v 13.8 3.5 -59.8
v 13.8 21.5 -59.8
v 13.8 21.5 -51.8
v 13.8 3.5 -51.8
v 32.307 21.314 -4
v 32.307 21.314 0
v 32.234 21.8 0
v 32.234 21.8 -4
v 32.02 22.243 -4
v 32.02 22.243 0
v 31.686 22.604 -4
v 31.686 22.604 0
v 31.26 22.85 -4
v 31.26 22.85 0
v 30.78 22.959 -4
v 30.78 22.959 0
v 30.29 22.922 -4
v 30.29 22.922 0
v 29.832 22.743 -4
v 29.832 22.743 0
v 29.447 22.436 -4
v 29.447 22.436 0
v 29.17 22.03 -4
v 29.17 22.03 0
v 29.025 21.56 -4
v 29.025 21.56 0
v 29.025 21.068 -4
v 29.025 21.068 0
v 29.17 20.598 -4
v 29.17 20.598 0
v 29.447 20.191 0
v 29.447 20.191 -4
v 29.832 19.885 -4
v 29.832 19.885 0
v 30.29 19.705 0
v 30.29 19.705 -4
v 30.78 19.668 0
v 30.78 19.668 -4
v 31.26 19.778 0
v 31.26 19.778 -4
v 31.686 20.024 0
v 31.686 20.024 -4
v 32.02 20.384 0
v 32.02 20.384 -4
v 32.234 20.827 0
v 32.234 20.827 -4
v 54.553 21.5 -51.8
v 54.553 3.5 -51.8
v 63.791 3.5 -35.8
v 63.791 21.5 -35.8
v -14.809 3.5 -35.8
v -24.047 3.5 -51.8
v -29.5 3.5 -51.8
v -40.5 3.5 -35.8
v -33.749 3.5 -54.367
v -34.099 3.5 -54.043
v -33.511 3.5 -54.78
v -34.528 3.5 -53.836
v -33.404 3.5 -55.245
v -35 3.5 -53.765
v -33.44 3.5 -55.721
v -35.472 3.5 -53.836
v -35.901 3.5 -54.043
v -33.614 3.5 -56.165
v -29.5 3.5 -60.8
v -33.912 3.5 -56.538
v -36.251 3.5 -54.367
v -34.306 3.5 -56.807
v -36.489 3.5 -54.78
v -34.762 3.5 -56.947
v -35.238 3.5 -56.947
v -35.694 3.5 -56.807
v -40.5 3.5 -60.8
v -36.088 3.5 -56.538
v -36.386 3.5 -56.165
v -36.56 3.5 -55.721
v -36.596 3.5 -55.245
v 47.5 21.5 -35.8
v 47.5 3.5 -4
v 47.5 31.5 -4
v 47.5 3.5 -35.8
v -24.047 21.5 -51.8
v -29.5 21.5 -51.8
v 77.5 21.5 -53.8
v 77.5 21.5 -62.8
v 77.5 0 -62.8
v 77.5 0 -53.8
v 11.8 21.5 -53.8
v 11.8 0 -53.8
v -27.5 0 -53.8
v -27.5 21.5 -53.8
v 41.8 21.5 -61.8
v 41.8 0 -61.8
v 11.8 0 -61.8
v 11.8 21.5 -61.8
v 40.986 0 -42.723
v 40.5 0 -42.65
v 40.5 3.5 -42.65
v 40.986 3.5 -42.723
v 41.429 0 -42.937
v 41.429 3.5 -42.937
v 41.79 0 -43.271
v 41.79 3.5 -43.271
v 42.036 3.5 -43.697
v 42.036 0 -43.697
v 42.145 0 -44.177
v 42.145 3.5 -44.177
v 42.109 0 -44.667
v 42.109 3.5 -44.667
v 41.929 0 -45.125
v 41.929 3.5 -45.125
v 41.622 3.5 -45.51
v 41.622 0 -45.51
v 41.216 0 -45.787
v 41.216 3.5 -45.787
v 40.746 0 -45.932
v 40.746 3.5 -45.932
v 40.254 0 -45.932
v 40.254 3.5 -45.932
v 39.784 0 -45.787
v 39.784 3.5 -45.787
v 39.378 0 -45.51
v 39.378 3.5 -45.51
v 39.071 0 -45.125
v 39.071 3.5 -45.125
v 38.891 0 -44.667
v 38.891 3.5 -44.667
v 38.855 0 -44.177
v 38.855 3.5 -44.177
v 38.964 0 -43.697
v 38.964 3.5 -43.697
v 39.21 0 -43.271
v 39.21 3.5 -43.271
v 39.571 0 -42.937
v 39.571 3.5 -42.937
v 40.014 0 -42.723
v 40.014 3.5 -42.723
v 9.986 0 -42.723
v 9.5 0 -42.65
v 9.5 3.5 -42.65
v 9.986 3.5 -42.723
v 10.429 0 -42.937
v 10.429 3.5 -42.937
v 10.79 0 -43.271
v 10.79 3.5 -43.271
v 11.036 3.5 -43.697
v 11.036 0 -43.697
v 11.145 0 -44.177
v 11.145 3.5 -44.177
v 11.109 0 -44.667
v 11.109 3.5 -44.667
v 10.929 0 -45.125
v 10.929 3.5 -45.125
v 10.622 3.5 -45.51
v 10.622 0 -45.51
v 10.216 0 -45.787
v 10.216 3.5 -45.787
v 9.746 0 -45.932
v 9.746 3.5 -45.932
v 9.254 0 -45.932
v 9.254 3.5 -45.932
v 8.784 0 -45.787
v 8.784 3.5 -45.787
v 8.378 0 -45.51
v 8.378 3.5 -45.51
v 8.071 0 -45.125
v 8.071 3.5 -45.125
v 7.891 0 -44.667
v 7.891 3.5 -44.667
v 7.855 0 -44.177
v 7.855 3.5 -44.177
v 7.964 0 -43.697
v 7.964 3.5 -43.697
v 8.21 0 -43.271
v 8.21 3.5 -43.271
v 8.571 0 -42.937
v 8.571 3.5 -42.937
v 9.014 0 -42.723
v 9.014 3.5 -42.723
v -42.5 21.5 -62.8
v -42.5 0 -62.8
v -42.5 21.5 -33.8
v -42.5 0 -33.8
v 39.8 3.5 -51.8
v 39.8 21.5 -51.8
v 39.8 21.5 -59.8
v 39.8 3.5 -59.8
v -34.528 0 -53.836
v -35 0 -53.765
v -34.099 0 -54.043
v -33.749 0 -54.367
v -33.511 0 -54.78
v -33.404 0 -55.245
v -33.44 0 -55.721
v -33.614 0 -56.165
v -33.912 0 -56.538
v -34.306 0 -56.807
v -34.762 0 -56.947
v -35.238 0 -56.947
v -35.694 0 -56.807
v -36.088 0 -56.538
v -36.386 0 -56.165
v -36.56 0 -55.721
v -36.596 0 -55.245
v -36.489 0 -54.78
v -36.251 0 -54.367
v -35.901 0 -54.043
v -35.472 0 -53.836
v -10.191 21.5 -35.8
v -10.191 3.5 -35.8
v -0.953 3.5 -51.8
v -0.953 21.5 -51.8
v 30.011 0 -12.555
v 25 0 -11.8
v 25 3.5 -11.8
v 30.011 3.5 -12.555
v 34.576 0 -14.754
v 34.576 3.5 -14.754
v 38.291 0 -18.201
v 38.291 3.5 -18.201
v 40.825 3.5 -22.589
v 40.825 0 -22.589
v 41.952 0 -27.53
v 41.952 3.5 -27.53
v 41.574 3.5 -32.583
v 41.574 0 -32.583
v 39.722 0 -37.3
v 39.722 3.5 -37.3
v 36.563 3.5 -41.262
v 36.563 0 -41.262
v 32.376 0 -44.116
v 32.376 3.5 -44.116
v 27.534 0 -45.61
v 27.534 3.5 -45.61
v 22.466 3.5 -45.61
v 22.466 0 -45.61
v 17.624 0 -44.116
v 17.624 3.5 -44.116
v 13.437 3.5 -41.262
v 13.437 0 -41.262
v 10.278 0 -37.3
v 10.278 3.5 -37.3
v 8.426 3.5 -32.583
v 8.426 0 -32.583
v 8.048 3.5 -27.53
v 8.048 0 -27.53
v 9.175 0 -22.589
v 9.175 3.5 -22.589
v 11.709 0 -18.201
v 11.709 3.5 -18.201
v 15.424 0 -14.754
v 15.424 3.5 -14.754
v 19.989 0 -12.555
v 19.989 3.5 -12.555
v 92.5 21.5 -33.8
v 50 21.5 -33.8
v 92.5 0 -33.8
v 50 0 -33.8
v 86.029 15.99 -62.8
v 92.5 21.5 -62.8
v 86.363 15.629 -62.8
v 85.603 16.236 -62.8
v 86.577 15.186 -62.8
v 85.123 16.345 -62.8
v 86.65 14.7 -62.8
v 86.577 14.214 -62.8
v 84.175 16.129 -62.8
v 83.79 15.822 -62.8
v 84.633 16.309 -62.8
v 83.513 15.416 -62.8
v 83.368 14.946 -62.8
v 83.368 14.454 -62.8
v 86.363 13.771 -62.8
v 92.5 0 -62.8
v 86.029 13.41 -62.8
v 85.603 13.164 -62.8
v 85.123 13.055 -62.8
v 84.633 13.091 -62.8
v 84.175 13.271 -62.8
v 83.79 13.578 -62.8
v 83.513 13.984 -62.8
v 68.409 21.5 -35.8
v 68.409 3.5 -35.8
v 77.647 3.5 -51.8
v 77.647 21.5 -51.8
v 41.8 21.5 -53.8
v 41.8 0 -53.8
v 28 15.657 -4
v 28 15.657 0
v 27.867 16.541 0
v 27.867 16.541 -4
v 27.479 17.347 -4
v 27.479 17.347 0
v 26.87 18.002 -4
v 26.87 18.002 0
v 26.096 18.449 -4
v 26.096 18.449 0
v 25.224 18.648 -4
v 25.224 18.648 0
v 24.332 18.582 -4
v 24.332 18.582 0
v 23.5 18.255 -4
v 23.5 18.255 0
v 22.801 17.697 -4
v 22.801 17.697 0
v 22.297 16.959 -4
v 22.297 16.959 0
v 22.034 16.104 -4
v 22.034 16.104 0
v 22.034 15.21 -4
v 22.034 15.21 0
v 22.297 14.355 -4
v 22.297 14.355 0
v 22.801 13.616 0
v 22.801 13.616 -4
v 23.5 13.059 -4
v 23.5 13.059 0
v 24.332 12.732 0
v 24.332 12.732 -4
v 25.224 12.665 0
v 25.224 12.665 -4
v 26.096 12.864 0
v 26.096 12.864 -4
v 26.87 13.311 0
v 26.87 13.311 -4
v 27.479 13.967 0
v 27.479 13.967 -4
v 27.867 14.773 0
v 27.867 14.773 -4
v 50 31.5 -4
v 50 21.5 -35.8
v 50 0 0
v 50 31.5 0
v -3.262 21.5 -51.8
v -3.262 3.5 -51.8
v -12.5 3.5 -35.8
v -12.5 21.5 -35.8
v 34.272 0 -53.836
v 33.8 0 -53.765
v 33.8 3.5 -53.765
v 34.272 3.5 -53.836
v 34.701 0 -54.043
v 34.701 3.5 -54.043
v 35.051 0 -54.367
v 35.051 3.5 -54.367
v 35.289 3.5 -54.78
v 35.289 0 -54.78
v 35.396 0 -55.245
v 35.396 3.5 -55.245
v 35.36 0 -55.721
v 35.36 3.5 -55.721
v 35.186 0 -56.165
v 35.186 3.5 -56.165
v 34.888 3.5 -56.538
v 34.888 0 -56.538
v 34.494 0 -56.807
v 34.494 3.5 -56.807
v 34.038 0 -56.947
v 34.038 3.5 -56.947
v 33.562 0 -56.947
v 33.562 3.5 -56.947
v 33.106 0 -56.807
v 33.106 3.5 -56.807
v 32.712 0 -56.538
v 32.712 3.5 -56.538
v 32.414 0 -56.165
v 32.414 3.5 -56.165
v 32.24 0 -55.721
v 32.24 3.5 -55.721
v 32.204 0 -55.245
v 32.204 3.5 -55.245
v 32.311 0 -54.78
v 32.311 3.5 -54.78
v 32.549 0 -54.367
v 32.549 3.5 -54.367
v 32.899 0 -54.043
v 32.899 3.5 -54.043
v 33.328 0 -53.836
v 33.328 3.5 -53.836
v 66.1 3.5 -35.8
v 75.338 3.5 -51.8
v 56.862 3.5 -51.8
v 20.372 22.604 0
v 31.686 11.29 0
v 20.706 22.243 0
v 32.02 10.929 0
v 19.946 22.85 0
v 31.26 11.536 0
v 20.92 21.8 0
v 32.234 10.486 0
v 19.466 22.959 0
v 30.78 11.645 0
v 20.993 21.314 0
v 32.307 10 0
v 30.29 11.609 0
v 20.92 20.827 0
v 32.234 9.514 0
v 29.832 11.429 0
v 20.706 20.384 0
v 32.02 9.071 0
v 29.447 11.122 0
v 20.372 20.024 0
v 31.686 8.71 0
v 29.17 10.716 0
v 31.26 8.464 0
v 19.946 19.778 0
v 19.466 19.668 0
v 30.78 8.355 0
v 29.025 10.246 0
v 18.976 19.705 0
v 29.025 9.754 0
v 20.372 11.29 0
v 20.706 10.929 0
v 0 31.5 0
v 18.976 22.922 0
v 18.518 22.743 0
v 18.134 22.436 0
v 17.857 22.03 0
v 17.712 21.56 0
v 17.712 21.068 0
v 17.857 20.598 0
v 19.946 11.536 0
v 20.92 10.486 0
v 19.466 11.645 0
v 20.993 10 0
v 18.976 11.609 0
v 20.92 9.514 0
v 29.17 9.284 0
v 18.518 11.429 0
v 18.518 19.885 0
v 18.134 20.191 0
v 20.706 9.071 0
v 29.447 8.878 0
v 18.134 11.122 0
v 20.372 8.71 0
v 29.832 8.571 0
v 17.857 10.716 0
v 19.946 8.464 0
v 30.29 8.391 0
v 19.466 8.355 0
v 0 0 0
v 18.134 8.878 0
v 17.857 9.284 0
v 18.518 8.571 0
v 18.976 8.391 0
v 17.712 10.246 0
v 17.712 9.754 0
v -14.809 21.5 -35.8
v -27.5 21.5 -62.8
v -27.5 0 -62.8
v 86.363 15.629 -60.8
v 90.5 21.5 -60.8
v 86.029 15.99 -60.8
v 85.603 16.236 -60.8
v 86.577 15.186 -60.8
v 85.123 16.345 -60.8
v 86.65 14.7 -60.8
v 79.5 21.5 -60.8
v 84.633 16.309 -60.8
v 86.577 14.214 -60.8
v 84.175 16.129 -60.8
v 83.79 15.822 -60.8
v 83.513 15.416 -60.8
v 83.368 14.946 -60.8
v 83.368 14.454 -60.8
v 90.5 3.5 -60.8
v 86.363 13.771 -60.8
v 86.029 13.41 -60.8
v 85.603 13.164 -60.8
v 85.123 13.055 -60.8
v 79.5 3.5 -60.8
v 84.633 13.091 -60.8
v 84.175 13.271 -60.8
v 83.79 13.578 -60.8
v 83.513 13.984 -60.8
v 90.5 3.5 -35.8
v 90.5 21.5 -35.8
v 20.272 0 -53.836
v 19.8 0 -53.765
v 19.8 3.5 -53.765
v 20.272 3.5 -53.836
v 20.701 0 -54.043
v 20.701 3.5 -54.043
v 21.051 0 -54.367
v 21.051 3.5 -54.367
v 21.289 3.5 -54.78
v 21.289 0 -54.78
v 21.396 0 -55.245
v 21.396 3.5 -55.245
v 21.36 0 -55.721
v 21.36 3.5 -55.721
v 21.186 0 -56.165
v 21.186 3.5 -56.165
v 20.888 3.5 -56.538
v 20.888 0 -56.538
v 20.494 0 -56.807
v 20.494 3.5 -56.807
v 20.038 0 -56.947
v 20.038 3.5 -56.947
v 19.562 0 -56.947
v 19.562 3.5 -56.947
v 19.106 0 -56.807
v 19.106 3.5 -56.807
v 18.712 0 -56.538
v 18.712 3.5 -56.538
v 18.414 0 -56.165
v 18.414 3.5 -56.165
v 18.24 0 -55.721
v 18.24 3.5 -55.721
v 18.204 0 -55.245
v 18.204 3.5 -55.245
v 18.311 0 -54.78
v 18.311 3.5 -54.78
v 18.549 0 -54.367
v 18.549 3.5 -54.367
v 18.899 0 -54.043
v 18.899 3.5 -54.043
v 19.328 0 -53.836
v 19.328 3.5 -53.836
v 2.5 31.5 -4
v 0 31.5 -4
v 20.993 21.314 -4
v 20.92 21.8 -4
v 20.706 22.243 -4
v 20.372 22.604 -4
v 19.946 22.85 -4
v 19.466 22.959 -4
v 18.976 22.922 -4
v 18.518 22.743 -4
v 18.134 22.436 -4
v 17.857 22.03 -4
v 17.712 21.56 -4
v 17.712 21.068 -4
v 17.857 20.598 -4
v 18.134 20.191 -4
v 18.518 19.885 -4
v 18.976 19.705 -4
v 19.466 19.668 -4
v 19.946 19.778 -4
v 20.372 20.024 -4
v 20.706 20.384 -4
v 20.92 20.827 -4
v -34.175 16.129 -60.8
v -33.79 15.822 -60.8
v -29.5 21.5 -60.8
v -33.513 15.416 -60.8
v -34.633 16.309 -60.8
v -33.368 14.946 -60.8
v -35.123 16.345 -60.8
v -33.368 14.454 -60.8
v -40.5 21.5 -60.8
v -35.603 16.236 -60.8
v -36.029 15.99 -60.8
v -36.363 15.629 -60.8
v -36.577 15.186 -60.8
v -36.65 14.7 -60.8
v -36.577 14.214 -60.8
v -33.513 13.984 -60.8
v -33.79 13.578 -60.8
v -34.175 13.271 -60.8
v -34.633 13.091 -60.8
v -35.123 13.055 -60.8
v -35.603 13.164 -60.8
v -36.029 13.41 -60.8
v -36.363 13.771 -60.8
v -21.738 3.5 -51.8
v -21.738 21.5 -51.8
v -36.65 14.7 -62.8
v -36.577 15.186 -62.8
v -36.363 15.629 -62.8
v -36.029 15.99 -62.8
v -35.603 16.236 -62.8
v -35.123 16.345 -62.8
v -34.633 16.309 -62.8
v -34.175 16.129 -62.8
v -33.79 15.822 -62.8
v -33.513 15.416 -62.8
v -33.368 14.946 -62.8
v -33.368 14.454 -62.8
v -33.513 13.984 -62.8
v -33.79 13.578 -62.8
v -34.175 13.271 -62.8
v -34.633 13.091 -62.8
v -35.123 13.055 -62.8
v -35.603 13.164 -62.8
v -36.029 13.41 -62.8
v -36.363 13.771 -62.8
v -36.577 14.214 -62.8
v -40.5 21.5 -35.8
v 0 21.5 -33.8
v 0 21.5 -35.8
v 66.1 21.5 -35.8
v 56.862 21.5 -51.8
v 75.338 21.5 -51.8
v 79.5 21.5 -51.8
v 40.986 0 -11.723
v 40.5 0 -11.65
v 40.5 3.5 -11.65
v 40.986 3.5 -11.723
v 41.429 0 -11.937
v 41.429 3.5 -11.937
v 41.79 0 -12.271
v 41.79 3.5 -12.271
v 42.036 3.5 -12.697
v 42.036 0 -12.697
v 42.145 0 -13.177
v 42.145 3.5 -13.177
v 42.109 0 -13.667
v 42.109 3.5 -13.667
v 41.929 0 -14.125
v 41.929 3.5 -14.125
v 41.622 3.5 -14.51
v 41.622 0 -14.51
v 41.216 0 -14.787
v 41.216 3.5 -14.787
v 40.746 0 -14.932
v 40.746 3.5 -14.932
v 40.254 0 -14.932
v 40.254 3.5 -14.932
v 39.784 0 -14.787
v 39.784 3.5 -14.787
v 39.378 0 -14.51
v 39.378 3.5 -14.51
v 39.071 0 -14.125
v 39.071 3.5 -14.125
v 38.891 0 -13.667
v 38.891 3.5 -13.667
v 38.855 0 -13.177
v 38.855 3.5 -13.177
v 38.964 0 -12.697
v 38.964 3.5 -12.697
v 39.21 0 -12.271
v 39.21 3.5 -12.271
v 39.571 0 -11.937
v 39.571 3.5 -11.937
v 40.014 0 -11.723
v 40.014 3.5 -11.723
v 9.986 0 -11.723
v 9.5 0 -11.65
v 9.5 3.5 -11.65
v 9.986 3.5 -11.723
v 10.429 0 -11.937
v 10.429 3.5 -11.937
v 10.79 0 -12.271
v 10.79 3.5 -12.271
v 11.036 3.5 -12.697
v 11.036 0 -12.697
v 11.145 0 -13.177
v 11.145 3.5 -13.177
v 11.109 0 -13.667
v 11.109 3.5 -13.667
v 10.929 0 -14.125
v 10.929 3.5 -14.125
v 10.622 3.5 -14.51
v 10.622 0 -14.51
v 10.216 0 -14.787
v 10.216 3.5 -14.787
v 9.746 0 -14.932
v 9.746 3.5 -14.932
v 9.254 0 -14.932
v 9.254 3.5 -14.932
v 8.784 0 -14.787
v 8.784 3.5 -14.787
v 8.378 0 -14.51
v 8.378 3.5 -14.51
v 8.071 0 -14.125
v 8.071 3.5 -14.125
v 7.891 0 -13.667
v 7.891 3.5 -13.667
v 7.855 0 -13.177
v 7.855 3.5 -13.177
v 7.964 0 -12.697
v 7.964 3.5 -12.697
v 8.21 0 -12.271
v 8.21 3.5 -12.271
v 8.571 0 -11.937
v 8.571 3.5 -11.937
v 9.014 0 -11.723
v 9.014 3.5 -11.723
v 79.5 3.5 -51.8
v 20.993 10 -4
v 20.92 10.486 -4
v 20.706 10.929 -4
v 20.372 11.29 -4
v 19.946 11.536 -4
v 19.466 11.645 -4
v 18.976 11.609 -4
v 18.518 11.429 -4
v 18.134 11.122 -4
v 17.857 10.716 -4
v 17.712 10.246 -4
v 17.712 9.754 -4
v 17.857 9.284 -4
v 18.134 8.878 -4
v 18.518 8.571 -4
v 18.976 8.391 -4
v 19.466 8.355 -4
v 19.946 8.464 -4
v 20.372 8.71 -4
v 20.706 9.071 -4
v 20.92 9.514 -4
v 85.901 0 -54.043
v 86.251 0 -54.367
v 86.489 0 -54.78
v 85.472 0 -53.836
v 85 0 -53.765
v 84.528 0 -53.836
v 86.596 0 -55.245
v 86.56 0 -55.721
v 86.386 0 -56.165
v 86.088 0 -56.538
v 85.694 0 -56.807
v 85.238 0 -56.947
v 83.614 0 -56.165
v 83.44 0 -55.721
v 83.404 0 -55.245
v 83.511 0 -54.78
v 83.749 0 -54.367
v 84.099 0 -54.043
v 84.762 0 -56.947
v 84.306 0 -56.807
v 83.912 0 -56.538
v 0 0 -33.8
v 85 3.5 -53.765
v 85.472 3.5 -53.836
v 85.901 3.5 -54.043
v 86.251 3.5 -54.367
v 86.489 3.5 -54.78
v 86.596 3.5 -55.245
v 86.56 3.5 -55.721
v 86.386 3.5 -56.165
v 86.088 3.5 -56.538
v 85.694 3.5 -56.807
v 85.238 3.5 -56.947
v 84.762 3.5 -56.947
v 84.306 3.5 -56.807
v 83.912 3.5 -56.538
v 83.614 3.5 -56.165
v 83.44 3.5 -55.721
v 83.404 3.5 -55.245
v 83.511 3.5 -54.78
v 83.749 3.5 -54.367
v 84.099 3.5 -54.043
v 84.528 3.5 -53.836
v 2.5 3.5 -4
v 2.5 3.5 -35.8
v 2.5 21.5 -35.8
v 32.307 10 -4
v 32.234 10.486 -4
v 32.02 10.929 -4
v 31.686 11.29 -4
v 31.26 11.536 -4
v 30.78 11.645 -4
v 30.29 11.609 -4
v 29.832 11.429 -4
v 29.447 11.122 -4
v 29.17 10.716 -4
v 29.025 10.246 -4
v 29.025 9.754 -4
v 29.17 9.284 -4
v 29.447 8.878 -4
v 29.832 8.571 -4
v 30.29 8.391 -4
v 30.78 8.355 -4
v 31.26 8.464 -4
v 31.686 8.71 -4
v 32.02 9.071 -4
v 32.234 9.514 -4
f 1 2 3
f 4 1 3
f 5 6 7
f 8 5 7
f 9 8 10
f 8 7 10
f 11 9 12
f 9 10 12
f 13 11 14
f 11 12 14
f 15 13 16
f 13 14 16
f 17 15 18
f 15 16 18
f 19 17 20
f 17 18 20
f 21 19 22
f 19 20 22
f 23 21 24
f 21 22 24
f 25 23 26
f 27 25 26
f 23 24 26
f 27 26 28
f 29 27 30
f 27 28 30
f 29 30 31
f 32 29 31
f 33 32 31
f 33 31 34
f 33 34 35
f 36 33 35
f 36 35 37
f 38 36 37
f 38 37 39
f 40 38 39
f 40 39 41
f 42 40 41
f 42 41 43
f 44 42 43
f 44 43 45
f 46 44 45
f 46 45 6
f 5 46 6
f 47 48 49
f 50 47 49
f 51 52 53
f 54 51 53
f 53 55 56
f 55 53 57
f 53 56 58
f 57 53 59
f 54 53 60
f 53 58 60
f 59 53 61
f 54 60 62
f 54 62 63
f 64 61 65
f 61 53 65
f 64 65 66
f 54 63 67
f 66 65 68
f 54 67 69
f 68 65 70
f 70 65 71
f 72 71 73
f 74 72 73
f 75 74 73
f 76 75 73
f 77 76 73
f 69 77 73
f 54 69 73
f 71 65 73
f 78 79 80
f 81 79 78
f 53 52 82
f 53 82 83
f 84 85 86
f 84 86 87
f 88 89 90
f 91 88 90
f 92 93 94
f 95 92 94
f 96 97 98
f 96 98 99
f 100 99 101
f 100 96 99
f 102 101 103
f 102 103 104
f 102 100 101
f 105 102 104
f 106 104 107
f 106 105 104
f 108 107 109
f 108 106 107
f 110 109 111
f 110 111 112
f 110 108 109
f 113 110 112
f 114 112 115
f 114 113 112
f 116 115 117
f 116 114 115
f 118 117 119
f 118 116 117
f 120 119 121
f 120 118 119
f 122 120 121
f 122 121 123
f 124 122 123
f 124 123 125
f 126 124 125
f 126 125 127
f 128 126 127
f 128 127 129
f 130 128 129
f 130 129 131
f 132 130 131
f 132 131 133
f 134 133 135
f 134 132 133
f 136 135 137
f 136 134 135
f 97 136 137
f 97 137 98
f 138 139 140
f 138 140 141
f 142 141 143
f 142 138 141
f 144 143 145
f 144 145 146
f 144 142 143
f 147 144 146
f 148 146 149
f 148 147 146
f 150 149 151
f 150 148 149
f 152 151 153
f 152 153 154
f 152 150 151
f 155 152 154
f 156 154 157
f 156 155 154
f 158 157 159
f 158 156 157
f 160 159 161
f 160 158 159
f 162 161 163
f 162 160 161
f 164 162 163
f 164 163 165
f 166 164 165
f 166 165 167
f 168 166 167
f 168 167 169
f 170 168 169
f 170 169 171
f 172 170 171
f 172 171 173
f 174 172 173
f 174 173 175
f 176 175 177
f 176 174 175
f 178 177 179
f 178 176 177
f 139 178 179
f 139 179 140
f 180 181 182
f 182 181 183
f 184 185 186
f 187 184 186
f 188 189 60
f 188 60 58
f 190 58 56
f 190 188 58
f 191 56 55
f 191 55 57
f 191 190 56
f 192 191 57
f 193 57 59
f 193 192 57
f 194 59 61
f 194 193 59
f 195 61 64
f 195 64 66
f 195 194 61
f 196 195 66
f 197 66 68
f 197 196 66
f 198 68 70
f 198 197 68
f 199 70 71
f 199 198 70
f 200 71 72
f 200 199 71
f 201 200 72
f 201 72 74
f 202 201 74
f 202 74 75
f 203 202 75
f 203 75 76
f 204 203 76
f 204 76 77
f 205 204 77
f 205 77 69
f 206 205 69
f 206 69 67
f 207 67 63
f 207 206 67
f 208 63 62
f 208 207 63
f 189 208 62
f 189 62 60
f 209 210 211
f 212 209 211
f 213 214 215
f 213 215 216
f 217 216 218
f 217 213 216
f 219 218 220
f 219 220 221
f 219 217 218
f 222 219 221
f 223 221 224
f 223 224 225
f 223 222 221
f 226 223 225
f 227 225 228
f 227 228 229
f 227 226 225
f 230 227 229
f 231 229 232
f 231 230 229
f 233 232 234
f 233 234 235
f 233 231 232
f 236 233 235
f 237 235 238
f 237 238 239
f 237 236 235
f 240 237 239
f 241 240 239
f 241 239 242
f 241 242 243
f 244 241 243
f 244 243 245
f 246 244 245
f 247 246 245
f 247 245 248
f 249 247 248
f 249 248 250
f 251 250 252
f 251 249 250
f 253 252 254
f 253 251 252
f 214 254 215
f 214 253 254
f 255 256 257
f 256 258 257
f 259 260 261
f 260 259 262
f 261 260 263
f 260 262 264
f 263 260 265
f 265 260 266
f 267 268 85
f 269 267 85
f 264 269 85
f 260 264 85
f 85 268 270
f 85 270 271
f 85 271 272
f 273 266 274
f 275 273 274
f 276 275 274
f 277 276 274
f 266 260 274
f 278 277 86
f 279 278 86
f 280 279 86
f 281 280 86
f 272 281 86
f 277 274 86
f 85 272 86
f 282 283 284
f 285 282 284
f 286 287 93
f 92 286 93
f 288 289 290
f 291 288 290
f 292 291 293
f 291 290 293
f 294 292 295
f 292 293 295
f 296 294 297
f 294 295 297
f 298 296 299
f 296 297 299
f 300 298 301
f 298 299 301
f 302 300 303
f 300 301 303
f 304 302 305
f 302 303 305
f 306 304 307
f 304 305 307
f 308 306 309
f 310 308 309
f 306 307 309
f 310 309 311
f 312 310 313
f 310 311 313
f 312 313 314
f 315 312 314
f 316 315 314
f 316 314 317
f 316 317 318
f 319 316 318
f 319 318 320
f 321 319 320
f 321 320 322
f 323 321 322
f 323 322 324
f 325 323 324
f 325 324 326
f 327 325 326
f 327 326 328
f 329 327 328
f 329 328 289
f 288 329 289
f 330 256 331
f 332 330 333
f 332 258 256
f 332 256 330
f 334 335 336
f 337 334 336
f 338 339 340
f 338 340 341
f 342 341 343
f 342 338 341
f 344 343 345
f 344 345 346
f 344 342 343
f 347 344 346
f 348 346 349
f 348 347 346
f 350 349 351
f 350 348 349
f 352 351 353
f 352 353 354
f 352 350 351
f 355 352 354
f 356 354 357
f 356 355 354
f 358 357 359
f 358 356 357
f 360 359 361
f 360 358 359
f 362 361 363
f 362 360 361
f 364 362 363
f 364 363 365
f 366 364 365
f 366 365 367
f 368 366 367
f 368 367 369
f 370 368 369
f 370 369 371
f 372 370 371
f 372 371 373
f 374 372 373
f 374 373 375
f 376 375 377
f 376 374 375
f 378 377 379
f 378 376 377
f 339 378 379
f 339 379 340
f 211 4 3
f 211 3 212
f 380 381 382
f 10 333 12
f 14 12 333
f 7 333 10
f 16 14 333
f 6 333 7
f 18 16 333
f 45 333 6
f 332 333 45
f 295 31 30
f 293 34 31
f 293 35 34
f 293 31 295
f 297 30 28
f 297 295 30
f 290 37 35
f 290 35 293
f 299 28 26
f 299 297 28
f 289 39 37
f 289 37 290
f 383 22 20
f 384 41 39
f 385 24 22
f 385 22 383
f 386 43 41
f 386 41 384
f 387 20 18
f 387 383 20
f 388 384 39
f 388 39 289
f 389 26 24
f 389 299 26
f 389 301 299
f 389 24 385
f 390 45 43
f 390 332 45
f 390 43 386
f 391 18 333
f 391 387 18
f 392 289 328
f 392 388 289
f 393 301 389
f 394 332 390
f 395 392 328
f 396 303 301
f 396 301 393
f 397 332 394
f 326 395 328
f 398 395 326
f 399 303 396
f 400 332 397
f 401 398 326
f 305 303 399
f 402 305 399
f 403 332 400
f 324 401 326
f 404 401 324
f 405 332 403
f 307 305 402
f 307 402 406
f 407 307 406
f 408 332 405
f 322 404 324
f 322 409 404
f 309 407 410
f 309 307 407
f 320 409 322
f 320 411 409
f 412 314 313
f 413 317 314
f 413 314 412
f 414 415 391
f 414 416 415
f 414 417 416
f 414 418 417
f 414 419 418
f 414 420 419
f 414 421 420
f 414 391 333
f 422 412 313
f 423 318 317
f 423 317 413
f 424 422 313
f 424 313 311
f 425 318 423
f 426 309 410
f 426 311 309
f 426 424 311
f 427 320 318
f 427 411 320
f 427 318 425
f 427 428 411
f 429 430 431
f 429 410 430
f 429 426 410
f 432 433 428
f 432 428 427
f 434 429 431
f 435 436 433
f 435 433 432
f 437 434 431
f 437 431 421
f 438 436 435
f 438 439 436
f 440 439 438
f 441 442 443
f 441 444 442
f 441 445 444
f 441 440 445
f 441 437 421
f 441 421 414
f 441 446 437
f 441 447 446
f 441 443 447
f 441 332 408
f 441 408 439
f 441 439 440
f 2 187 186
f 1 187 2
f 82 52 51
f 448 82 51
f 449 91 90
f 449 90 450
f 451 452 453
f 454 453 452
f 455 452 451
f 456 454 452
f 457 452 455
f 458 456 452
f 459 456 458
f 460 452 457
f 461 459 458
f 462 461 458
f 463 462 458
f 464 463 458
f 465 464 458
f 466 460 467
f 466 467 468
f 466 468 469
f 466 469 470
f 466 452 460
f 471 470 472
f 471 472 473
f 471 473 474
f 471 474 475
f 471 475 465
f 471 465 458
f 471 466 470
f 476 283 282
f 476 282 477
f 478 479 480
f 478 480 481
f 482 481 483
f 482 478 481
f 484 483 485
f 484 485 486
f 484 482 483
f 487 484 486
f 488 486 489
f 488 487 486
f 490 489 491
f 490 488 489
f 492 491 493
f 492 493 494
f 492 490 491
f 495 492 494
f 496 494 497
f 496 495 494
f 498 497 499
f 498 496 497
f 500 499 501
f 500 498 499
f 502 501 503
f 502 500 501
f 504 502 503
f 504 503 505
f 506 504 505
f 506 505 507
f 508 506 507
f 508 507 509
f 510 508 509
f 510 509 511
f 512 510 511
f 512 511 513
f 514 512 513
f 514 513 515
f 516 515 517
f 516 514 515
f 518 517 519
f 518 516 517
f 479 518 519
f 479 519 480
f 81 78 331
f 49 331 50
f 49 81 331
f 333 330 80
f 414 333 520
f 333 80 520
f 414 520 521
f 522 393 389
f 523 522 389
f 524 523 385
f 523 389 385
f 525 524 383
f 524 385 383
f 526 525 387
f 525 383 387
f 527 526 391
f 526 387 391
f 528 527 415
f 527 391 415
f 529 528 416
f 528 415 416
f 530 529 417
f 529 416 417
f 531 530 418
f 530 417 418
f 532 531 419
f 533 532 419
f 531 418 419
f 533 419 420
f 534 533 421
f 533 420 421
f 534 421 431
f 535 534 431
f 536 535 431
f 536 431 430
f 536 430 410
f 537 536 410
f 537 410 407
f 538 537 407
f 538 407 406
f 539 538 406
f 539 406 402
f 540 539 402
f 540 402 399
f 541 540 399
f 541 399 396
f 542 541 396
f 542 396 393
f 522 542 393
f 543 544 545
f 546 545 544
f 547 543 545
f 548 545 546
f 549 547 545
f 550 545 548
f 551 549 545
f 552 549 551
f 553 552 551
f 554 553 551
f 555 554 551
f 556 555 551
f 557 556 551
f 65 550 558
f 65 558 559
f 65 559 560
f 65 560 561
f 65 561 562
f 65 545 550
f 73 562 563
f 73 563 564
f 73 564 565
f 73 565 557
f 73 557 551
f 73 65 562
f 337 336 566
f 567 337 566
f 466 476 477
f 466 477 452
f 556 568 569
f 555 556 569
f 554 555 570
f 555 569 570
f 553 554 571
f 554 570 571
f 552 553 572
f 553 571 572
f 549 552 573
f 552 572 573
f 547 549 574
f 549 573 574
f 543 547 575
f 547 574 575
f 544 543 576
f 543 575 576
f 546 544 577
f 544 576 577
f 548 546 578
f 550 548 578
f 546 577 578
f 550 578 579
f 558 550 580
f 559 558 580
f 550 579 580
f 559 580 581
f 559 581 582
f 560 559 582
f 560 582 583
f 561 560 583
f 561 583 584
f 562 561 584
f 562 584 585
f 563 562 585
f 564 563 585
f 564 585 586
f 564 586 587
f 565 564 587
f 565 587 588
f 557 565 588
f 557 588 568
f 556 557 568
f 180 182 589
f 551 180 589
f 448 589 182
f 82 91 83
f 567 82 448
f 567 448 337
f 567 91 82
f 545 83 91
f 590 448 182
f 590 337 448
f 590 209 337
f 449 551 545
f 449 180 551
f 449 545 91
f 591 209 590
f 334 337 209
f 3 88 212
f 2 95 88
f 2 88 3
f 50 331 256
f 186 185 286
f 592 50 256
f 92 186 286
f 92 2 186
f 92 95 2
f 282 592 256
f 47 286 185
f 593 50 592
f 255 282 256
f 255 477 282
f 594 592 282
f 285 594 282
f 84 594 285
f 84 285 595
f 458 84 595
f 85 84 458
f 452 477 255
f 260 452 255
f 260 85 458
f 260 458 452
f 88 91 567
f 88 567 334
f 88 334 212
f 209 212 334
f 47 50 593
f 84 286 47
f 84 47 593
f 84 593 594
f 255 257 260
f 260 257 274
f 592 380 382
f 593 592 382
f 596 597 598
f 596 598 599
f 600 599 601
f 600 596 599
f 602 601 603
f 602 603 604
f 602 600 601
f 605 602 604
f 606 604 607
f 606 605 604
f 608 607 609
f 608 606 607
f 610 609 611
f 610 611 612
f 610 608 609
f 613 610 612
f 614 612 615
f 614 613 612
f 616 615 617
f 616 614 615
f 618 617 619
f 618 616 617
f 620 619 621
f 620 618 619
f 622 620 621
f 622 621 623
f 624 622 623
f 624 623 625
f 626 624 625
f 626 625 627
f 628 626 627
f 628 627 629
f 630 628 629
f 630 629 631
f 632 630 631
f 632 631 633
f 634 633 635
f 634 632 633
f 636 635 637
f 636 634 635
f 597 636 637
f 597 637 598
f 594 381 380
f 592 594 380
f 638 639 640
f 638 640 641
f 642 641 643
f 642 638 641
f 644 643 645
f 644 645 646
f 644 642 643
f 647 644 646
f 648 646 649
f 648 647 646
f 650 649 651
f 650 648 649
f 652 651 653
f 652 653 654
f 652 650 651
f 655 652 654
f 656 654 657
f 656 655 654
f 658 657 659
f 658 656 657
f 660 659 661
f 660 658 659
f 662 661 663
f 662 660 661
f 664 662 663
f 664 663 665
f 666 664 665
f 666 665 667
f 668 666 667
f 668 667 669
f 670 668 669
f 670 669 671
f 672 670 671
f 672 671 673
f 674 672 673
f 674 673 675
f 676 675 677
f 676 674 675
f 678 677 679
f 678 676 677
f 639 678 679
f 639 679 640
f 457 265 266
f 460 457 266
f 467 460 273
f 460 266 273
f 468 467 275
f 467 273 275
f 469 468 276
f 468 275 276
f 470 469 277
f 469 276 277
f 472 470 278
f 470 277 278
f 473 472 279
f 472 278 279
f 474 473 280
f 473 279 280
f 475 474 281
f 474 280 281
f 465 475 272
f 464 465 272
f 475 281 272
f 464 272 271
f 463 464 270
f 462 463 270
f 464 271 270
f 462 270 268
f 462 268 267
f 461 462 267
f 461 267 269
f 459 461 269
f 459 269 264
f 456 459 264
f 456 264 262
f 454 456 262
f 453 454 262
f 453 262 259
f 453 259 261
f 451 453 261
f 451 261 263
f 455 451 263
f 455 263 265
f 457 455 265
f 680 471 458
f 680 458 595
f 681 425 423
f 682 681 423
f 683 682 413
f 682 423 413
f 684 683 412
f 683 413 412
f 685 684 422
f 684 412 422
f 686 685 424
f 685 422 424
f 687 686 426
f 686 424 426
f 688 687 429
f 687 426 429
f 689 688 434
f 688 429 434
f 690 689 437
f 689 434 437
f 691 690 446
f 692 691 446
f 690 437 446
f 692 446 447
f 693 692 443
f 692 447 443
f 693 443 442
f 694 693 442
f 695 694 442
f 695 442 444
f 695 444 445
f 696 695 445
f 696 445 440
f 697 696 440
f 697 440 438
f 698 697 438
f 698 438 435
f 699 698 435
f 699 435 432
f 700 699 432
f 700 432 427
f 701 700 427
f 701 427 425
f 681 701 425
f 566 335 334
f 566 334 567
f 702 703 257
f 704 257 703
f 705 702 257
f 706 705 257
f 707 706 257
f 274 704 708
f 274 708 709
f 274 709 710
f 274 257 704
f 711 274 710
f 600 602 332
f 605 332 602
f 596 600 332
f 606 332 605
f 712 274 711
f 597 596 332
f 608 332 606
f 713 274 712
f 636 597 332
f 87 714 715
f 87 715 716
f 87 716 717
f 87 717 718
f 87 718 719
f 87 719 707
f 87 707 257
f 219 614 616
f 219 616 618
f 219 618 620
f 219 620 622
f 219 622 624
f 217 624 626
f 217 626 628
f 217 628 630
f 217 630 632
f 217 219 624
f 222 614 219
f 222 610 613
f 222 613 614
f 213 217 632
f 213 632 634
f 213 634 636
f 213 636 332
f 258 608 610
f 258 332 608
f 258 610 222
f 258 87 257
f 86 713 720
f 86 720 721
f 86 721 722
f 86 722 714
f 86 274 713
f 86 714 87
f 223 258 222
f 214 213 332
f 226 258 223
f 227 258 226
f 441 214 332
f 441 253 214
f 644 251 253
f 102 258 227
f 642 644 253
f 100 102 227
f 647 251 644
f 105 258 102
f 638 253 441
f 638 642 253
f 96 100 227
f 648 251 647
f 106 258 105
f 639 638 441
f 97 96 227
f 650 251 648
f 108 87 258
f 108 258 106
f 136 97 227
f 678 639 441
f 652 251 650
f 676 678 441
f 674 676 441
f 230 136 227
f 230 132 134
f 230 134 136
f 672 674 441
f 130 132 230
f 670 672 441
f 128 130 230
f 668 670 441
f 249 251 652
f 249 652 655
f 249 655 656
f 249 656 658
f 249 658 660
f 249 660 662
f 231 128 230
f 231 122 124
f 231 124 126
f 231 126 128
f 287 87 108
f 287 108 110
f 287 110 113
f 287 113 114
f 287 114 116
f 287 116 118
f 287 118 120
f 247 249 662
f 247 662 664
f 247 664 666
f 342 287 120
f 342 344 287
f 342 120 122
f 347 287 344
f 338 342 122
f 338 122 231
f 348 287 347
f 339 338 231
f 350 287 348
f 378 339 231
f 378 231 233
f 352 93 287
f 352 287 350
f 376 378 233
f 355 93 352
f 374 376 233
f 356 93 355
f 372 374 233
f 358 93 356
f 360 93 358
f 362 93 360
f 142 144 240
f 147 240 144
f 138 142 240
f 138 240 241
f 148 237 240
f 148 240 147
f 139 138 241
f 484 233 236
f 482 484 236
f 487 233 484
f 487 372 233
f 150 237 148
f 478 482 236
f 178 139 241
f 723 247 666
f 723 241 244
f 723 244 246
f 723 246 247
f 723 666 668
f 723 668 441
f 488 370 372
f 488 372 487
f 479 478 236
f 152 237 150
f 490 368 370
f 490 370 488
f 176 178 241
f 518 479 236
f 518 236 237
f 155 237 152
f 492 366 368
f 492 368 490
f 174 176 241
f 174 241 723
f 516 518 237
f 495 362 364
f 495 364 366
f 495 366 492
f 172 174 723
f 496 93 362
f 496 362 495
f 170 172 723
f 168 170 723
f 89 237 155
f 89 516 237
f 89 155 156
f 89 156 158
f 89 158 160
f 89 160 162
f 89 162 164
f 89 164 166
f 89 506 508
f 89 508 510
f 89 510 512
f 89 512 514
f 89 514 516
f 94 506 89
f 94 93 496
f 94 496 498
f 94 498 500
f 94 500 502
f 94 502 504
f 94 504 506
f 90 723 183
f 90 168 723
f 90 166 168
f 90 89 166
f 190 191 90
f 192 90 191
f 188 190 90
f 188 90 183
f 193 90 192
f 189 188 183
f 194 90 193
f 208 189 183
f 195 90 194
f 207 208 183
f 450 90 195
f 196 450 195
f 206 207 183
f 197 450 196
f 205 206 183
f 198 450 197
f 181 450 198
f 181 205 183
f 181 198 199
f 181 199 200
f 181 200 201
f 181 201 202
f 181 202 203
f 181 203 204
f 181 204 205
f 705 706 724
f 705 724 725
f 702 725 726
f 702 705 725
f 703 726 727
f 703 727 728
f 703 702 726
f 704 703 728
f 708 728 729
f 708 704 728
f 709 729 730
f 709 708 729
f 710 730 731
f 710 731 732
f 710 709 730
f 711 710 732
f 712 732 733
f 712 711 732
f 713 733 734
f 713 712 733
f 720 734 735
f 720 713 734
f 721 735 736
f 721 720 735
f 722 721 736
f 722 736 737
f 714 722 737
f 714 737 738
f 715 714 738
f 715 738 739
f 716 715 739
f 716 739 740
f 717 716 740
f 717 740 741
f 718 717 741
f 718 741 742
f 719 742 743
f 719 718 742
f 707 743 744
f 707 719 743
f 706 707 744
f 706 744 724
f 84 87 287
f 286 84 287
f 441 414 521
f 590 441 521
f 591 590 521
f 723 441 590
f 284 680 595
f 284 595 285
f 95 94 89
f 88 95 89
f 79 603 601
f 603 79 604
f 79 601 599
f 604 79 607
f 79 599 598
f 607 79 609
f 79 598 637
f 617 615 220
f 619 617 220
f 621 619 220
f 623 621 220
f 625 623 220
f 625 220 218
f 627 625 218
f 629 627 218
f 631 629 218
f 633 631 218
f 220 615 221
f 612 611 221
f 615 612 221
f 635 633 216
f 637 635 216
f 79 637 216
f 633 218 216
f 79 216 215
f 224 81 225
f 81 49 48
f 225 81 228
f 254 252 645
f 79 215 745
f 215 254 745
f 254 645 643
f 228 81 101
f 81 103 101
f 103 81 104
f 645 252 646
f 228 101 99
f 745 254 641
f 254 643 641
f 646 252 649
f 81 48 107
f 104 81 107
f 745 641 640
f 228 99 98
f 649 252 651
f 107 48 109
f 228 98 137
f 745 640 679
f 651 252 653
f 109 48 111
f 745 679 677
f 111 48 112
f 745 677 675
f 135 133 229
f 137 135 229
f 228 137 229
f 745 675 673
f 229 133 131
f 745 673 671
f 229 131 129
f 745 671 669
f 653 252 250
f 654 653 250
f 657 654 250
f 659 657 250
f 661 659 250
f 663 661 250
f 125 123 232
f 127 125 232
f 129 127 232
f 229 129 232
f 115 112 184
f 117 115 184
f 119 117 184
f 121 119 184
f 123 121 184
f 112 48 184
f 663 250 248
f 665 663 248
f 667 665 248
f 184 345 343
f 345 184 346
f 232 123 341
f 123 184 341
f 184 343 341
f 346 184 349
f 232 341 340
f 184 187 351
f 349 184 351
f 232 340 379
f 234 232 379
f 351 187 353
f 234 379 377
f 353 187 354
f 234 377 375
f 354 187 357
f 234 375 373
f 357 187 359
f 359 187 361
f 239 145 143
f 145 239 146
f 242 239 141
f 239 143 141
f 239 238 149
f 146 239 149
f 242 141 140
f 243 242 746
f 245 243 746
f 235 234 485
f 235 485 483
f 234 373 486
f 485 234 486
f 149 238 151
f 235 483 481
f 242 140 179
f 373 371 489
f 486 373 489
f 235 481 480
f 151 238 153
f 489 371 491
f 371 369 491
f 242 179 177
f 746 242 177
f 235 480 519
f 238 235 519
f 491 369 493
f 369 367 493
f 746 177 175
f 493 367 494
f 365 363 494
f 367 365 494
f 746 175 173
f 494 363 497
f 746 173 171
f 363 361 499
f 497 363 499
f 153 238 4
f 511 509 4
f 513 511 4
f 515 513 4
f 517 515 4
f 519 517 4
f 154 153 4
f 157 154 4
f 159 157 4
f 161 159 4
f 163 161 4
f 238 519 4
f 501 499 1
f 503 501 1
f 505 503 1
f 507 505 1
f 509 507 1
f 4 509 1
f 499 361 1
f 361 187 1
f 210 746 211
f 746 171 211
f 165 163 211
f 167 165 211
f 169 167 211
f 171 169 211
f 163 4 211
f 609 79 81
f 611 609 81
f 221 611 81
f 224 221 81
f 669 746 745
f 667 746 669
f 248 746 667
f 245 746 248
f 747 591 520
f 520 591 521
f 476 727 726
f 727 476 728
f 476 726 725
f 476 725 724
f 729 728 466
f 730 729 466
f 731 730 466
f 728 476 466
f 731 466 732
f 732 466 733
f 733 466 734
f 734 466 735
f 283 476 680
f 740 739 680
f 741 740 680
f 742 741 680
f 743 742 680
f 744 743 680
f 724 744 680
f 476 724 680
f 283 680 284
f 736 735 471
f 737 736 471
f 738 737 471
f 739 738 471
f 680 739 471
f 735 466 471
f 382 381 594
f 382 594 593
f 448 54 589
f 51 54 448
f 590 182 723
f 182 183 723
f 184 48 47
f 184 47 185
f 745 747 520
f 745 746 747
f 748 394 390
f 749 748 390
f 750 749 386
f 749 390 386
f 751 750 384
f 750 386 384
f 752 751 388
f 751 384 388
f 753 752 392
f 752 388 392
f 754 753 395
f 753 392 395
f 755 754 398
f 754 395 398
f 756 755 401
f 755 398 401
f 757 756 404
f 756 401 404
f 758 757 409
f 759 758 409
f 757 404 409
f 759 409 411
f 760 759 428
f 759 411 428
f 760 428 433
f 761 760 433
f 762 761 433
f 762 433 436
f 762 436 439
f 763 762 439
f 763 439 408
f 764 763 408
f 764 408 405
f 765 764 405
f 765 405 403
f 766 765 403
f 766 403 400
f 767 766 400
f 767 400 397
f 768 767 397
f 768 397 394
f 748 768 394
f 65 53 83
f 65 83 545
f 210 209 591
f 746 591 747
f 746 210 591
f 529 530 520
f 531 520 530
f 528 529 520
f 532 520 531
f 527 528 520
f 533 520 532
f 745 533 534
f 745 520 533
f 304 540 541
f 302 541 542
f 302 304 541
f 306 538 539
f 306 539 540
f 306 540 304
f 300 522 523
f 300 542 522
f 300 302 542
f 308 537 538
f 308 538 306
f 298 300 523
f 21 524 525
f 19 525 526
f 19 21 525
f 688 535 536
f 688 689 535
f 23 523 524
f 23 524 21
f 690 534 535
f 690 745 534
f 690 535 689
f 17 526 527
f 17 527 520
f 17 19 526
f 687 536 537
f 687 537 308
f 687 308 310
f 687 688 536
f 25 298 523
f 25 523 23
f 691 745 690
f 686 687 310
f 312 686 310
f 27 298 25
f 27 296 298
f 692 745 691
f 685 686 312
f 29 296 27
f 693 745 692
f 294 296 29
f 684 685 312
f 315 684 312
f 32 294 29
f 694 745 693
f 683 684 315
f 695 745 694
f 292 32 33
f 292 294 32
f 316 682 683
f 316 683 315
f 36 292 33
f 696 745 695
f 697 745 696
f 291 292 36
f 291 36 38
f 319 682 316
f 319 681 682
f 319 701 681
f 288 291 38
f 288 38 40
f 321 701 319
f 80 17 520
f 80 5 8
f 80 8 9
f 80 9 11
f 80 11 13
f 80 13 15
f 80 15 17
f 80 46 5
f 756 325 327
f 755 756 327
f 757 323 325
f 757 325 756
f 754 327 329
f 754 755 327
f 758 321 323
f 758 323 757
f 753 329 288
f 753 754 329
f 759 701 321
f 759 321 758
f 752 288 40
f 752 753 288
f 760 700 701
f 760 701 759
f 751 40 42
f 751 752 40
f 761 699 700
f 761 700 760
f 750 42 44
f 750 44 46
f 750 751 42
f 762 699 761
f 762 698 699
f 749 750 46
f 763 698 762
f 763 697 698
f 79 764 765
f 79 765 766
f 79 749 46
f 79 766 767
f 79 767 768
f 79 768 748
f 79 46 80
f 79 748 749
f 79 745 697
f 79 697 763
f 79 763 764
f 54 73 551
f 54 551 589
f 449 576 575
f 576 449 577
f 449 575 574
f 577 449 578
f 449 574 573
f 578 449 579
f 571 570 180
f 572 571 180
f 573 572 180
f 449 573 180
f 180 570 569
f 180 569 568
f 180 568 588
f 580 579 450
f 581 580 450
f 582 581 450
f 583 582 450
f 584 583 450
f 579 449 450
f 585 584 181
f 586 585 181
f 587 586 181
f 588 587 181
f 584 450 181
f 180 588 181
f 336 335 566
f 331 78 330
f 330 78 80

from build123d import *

# Parameters (mm, degrees)
SKETCH_2_R          = 1.6
SKETCH_2_R_2        = 17
SKETCH_2_R_3        = 1.65
EXTRUDE_2_DEPTH     = 3.5
EXTRUDE_3_DEPTH     = 18
EXTRUDE_4_DEPTH     = 10
CUT_EXTRUDE_5_DEPTH = 117.156532317
SKETCH_10_R         = 3
SKETCH_10_R_2       = 1.65
CUT_EXTRUDE_4_DEPTH = 5
EXTRUDE_5_DEPTH     = 18
SKETCH_14_R         = 1.65
CUT_EXTRUDE_6_DEPTH = 10


with BuildPart() as part:
    # 草图2 → 凸台-拉伸2 (new body)
    with BuildSketch(Plane(origin=(0, 0, 0), x_dir=(1, 0, 0), z_dir=(0, 1, 0))):
        Polygon((-42.5, 33.8), (-42.5, 62.8), (-27.5, 62.8), (-27.5, 53.8), (11.8, 53.8), (11.8, 61.8), (41.8, 61.8), (41.8, 53.8), (77.5, 53.8), (77.5, 62.8), (92.5, 62.8), (92.5, 33.8), (50, 33.8), (50, 0), (0, 0), (0, 33.8), align=None)
        with Locations(Location((-35, 55.365042575, 0), (0, 0, 270))):
            Circle(SKETCH_2_R, mode=Mode.SUBTRACT)
        with Locations(Location((85, 55.365042575, 0), (0, 0, 270))):
            Circle(SKETCH_2_R, mode=Mode.SUBTRACT)
        with Locations(Location((19.8, 55.365042575, 0), (0, 0, 270))):
            Circle(SKETCH_2_R, mode=Mode.SUBTRACT)
        with Locations(Location((33.8, 55.365042575, 0), (0, 0, 270))):
            Circle(SKETCH_2_R, mode=Mode.SUBTRACT)
        with Locations(Location((25, 28.8, 0), (0, 0, 270))):
            Circle(SKETCH_2_R_2, mode=Mode.SUBTRACT)
        with Locations(Location((40.5, 44.3, 0), (0, 0, 270))):
            Circle(SKETCH_2_R_3, mode=Mode.SUBTRACT)
        with Locations(Location((40.5, 13.3, 0), (0, 0, 270))):
            Circle(SKETCH_2_R_3, mode=Mode.SUBTRACT)
        with Locations(Location((9.5, 13.3, 0), (0, 0, 270))):
            Circle(SKETCH_2_R_3, mode=Mode.SUBTRACT)
        with Locations(Location((9.5, 44.3, 0), (0, 0, 270))):
            Circle(SKETCH_2_R_3, mode=Mode.SUBTRACT)
    extrude(amount=EXTRUDE_2_DEPTH)

    # 草图6 → 凸台-拉伸3 (add)
    with BuildSketch(Plane(origin=(0, 3.5, 0), x_dir=(1, 0, 0), z_dir=(0, 1, 0))):
        Polygon((11.8, 53.8), (-27.5, 53.8), (-27.5, 62.8), (-42.5, 62.8), (-42.5, 33.8), (0, 33.8), (0, 0), (50, 0), (50, 33.8), (92.5, 33.8), (92.5, 62.8), (77.5, 62.8), (77.5, 53.8), (41.8, 53.8), (41.8, 61.8), (11.8, 61.8), align=None)
        Polygon((13.8, 51.8), (-29.5, 51.8), (-29.5, 60.8), (-40.5, 60.8), (-40.5, 35.8), (2.5, 35.8), (2.5, 4), (47.5, 4), (47.5, 35.8), (90.5, 35.8), (90.5, 60.8), (79.5, 60.8), (79.5, 51.8), (39.8, 51.8), (39.8, 59.8), (13.8, 59.8), align=None, mode=Mode.SUBTRACT)
    extrude(amount=EXTRUDE_3_DEPTH)

    # 草图11 → 凸台-拉伸4 (add)
    with BuildSketch(Plane(origin=(0, 21.5, 0), x_dir=(1, 0, 0), z_dir=(0, 1, 0))):
        Polygon((2.5, 35.8), (2.5, 4), (47.5, 4), (47.5, 35.8), (50, 35.8), (50, 0), (0, 0), (0, 35.8), align=None)
    extrude(amount=EXTRUDE_4_DEPTH)

    # 草图12 → 切除-拉伸5 (cut, through all)
    with BuildSketch(Plane.ZY):
        Polygon((-35.8, 21.5), (-4, 31.5), (-35.8, 31.5), align=None)
    extrude(amount=-CUT_EXTRUDE_5_DEPTH, mode=Mode.SUBTRACT)

    # 草图10 → 切除-拉伸4 (cut)
    with BuildSketch(Plane.XY):
        with Locations((25, 15.656854249)):
            Circle(SKETCH_10_R)
        with Locations((30.656854249, 21.313708499)):
            Circle(SKETCH_10_R_2)
        with Locations((30.656854249, 10)):
            Circle(SKETCH_10_R_2)
        with Locations((19.343145751, 10)):
            Circle(SKETCH_10_R_2)
        with Locations((19.343145751, 21.313708499)):
            Circle(SKETCH_10_R_2)
    extrude(amount=-CUT_EXTRUDE_4_DEPTH, mode=Mode.SUBTRACT)

    # 草图13 → 凸台-拉伸5 (add)
    with BuildSketch(Plane(origin=(0, 3.5, 0), x_dir=(1, 0, 0), z_dir=(0, 1, 0))):
        Polygon((-12.5, 35.8), (-21.737604307, 51.8), (-24.047005384, 51.8), (-14.809401077, 35.8), align=None)
        Polygon((-3.262395693, 51.8), (-12.5, 35.8), (-10.190598923, 35.8), (-0.952994616, 51.8), align=None)
        Polygon((54.552994616, 51.8), (63.790598923, 35.8), (66.1, 35.8), (56.862395693, 51.8), align=None)
        Polygon((75.337604307, 51.8), (66.1, 35.8), (68.409401077, 35.8), (77.647005384, 51.8), align=None)
    extrude(amount=EXTRUDE_5_DEPTH)

    # 草图14 → 切除-拉伸6 (cut)
    with BuildSketch(Plane(origin=(0, 0, -62.8), x_dir=(-1, 0, 0), z_dir=(0, 0, -1))):
        with Locations((35, 14.7)):
            Circle(SKETCH_14_R)
        with Locations(Location((-85, 14.7, 0), (0, 0, 180))):
            Circle(SKETCH_14_R)
    extrude(amount=-CUT_EXTRUDE_6_DEPTH, mode=Mode.SUBTRACT)


solid = part.part
